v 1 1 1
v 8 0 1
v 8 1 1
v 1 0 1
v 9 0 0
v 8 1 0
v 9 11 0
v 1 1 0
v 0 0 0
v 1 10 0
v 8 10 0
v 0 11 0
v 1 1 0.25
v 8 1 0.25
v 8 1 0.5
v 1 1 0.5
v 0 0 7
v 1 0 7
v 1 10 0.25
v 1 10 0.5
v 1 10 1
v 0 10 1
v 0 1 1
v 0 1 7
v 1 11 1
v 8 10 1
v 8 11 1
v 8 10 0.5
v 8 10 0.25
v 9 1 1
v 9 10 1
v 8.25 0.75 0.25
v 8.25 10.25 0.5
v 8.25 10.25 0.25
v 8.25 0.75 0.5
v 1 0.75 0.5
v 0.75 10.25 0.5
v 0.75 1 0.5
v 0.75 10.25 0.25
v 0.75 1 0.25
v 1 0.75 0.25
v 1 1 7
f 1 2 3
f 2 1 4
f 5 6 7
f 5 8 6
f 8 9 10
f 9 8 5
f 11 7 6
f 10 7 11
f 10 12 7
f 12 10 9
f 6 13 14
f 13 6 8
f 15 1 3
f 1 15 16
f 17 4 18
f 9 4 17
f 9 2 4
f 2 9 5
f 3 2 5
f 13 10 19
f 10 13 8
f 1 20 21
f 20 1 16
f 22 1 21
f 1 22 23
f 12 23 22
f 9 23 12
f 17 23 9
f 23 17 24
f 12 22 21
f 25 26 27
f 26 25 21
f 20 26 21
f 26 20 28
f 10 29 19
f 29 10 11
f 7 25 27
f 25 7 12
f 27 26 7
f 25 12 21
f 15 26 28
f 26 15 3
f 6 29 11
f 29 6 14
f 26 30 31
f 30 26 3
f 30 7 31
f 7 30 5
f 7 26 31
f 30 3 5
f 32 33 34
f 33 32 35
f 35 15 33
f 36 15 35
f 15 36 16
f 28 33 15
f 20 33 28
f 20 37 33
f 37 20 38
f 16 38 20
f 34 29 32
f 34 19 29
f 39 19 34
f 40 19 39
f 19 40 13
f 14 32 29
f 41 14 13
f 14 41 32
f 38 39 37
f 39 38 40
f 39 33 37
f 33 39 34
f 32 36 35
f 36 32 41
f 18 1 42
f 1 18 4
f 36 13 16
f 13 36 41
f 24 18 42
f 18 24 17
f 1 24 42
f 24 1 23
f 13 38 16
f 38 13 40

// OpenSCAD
inner_content_dims = [6.5, 4.5, 8.5];
inner_padding = 0.25;
frame_thick = 1;
tab_thick = 1/4;

inner_dims = ([inner_padding, inner_padding, inner_padding] * 2) + inner_content_dims;
echo (inner_dims);

module bottom_x_frame() {
    outer_x = inner_dims[0] + frame_thick * 2;
    intersection() {
        cube([outer_x, frame_thick, frame_thick]);
        translate([outer_x / 2, outer_x / 2, -1])        
        rotate([0, 0, 45 + 180])
            cube([100, 100, 100]);
        
        translate([outer_x / 2, -1, outer_x / 2])
        rotate([0, 180 - 45, 0])
            cube([100, 100, 100]);
    }
}

module bottom_y_frame() {
    outer_y = inner_dims[2] + frame_thick * 2;
    intersection() {
        cube([frame_thick, outer_y, frame_thick]);
        translate([outer_y / 2, outer_y / 2, -1])        
        rotate([0, 0, -45 + 180])
            cube([100, 100, 100]);
        
        translate([-1, outer_y / 2, outer_y / 2])
        rotate([45 + 180, 0, 0])
            cube([100, 100, 100]);
        
    }
}

module side_frame() {
    outer_z = inner_dims[1] + frame_thick * 2;
    cube([frame_thick, frame_thick, outer_z]);
}

module bottom() {
    difference() {
    union() {
    bottom_x_frame();
    
    bottom_y_frame();
    
    translate([inner_dims[0] + frame_thick * 2, inner_dims[2] + frame_thick * 2, 0])
        rotate([0, 0, 180])
            bottom_x_frame();
    translate([inner_dims[0] + frame_thick * 2, inner_dims[2] + frame_thick * 2, 0])
        rotate([0, 0, 180])
           bottom_y_frame();
    }
    
    translate([frame_thick - tab_thick, frame_thick - tab_thick, tab_thick])
        cube([inner_dims[0] + 2 * tab_thick, inner_dims[2] + 2 * tab_thick, tab_thick]);
    }
}

bottom();
side_frame();
